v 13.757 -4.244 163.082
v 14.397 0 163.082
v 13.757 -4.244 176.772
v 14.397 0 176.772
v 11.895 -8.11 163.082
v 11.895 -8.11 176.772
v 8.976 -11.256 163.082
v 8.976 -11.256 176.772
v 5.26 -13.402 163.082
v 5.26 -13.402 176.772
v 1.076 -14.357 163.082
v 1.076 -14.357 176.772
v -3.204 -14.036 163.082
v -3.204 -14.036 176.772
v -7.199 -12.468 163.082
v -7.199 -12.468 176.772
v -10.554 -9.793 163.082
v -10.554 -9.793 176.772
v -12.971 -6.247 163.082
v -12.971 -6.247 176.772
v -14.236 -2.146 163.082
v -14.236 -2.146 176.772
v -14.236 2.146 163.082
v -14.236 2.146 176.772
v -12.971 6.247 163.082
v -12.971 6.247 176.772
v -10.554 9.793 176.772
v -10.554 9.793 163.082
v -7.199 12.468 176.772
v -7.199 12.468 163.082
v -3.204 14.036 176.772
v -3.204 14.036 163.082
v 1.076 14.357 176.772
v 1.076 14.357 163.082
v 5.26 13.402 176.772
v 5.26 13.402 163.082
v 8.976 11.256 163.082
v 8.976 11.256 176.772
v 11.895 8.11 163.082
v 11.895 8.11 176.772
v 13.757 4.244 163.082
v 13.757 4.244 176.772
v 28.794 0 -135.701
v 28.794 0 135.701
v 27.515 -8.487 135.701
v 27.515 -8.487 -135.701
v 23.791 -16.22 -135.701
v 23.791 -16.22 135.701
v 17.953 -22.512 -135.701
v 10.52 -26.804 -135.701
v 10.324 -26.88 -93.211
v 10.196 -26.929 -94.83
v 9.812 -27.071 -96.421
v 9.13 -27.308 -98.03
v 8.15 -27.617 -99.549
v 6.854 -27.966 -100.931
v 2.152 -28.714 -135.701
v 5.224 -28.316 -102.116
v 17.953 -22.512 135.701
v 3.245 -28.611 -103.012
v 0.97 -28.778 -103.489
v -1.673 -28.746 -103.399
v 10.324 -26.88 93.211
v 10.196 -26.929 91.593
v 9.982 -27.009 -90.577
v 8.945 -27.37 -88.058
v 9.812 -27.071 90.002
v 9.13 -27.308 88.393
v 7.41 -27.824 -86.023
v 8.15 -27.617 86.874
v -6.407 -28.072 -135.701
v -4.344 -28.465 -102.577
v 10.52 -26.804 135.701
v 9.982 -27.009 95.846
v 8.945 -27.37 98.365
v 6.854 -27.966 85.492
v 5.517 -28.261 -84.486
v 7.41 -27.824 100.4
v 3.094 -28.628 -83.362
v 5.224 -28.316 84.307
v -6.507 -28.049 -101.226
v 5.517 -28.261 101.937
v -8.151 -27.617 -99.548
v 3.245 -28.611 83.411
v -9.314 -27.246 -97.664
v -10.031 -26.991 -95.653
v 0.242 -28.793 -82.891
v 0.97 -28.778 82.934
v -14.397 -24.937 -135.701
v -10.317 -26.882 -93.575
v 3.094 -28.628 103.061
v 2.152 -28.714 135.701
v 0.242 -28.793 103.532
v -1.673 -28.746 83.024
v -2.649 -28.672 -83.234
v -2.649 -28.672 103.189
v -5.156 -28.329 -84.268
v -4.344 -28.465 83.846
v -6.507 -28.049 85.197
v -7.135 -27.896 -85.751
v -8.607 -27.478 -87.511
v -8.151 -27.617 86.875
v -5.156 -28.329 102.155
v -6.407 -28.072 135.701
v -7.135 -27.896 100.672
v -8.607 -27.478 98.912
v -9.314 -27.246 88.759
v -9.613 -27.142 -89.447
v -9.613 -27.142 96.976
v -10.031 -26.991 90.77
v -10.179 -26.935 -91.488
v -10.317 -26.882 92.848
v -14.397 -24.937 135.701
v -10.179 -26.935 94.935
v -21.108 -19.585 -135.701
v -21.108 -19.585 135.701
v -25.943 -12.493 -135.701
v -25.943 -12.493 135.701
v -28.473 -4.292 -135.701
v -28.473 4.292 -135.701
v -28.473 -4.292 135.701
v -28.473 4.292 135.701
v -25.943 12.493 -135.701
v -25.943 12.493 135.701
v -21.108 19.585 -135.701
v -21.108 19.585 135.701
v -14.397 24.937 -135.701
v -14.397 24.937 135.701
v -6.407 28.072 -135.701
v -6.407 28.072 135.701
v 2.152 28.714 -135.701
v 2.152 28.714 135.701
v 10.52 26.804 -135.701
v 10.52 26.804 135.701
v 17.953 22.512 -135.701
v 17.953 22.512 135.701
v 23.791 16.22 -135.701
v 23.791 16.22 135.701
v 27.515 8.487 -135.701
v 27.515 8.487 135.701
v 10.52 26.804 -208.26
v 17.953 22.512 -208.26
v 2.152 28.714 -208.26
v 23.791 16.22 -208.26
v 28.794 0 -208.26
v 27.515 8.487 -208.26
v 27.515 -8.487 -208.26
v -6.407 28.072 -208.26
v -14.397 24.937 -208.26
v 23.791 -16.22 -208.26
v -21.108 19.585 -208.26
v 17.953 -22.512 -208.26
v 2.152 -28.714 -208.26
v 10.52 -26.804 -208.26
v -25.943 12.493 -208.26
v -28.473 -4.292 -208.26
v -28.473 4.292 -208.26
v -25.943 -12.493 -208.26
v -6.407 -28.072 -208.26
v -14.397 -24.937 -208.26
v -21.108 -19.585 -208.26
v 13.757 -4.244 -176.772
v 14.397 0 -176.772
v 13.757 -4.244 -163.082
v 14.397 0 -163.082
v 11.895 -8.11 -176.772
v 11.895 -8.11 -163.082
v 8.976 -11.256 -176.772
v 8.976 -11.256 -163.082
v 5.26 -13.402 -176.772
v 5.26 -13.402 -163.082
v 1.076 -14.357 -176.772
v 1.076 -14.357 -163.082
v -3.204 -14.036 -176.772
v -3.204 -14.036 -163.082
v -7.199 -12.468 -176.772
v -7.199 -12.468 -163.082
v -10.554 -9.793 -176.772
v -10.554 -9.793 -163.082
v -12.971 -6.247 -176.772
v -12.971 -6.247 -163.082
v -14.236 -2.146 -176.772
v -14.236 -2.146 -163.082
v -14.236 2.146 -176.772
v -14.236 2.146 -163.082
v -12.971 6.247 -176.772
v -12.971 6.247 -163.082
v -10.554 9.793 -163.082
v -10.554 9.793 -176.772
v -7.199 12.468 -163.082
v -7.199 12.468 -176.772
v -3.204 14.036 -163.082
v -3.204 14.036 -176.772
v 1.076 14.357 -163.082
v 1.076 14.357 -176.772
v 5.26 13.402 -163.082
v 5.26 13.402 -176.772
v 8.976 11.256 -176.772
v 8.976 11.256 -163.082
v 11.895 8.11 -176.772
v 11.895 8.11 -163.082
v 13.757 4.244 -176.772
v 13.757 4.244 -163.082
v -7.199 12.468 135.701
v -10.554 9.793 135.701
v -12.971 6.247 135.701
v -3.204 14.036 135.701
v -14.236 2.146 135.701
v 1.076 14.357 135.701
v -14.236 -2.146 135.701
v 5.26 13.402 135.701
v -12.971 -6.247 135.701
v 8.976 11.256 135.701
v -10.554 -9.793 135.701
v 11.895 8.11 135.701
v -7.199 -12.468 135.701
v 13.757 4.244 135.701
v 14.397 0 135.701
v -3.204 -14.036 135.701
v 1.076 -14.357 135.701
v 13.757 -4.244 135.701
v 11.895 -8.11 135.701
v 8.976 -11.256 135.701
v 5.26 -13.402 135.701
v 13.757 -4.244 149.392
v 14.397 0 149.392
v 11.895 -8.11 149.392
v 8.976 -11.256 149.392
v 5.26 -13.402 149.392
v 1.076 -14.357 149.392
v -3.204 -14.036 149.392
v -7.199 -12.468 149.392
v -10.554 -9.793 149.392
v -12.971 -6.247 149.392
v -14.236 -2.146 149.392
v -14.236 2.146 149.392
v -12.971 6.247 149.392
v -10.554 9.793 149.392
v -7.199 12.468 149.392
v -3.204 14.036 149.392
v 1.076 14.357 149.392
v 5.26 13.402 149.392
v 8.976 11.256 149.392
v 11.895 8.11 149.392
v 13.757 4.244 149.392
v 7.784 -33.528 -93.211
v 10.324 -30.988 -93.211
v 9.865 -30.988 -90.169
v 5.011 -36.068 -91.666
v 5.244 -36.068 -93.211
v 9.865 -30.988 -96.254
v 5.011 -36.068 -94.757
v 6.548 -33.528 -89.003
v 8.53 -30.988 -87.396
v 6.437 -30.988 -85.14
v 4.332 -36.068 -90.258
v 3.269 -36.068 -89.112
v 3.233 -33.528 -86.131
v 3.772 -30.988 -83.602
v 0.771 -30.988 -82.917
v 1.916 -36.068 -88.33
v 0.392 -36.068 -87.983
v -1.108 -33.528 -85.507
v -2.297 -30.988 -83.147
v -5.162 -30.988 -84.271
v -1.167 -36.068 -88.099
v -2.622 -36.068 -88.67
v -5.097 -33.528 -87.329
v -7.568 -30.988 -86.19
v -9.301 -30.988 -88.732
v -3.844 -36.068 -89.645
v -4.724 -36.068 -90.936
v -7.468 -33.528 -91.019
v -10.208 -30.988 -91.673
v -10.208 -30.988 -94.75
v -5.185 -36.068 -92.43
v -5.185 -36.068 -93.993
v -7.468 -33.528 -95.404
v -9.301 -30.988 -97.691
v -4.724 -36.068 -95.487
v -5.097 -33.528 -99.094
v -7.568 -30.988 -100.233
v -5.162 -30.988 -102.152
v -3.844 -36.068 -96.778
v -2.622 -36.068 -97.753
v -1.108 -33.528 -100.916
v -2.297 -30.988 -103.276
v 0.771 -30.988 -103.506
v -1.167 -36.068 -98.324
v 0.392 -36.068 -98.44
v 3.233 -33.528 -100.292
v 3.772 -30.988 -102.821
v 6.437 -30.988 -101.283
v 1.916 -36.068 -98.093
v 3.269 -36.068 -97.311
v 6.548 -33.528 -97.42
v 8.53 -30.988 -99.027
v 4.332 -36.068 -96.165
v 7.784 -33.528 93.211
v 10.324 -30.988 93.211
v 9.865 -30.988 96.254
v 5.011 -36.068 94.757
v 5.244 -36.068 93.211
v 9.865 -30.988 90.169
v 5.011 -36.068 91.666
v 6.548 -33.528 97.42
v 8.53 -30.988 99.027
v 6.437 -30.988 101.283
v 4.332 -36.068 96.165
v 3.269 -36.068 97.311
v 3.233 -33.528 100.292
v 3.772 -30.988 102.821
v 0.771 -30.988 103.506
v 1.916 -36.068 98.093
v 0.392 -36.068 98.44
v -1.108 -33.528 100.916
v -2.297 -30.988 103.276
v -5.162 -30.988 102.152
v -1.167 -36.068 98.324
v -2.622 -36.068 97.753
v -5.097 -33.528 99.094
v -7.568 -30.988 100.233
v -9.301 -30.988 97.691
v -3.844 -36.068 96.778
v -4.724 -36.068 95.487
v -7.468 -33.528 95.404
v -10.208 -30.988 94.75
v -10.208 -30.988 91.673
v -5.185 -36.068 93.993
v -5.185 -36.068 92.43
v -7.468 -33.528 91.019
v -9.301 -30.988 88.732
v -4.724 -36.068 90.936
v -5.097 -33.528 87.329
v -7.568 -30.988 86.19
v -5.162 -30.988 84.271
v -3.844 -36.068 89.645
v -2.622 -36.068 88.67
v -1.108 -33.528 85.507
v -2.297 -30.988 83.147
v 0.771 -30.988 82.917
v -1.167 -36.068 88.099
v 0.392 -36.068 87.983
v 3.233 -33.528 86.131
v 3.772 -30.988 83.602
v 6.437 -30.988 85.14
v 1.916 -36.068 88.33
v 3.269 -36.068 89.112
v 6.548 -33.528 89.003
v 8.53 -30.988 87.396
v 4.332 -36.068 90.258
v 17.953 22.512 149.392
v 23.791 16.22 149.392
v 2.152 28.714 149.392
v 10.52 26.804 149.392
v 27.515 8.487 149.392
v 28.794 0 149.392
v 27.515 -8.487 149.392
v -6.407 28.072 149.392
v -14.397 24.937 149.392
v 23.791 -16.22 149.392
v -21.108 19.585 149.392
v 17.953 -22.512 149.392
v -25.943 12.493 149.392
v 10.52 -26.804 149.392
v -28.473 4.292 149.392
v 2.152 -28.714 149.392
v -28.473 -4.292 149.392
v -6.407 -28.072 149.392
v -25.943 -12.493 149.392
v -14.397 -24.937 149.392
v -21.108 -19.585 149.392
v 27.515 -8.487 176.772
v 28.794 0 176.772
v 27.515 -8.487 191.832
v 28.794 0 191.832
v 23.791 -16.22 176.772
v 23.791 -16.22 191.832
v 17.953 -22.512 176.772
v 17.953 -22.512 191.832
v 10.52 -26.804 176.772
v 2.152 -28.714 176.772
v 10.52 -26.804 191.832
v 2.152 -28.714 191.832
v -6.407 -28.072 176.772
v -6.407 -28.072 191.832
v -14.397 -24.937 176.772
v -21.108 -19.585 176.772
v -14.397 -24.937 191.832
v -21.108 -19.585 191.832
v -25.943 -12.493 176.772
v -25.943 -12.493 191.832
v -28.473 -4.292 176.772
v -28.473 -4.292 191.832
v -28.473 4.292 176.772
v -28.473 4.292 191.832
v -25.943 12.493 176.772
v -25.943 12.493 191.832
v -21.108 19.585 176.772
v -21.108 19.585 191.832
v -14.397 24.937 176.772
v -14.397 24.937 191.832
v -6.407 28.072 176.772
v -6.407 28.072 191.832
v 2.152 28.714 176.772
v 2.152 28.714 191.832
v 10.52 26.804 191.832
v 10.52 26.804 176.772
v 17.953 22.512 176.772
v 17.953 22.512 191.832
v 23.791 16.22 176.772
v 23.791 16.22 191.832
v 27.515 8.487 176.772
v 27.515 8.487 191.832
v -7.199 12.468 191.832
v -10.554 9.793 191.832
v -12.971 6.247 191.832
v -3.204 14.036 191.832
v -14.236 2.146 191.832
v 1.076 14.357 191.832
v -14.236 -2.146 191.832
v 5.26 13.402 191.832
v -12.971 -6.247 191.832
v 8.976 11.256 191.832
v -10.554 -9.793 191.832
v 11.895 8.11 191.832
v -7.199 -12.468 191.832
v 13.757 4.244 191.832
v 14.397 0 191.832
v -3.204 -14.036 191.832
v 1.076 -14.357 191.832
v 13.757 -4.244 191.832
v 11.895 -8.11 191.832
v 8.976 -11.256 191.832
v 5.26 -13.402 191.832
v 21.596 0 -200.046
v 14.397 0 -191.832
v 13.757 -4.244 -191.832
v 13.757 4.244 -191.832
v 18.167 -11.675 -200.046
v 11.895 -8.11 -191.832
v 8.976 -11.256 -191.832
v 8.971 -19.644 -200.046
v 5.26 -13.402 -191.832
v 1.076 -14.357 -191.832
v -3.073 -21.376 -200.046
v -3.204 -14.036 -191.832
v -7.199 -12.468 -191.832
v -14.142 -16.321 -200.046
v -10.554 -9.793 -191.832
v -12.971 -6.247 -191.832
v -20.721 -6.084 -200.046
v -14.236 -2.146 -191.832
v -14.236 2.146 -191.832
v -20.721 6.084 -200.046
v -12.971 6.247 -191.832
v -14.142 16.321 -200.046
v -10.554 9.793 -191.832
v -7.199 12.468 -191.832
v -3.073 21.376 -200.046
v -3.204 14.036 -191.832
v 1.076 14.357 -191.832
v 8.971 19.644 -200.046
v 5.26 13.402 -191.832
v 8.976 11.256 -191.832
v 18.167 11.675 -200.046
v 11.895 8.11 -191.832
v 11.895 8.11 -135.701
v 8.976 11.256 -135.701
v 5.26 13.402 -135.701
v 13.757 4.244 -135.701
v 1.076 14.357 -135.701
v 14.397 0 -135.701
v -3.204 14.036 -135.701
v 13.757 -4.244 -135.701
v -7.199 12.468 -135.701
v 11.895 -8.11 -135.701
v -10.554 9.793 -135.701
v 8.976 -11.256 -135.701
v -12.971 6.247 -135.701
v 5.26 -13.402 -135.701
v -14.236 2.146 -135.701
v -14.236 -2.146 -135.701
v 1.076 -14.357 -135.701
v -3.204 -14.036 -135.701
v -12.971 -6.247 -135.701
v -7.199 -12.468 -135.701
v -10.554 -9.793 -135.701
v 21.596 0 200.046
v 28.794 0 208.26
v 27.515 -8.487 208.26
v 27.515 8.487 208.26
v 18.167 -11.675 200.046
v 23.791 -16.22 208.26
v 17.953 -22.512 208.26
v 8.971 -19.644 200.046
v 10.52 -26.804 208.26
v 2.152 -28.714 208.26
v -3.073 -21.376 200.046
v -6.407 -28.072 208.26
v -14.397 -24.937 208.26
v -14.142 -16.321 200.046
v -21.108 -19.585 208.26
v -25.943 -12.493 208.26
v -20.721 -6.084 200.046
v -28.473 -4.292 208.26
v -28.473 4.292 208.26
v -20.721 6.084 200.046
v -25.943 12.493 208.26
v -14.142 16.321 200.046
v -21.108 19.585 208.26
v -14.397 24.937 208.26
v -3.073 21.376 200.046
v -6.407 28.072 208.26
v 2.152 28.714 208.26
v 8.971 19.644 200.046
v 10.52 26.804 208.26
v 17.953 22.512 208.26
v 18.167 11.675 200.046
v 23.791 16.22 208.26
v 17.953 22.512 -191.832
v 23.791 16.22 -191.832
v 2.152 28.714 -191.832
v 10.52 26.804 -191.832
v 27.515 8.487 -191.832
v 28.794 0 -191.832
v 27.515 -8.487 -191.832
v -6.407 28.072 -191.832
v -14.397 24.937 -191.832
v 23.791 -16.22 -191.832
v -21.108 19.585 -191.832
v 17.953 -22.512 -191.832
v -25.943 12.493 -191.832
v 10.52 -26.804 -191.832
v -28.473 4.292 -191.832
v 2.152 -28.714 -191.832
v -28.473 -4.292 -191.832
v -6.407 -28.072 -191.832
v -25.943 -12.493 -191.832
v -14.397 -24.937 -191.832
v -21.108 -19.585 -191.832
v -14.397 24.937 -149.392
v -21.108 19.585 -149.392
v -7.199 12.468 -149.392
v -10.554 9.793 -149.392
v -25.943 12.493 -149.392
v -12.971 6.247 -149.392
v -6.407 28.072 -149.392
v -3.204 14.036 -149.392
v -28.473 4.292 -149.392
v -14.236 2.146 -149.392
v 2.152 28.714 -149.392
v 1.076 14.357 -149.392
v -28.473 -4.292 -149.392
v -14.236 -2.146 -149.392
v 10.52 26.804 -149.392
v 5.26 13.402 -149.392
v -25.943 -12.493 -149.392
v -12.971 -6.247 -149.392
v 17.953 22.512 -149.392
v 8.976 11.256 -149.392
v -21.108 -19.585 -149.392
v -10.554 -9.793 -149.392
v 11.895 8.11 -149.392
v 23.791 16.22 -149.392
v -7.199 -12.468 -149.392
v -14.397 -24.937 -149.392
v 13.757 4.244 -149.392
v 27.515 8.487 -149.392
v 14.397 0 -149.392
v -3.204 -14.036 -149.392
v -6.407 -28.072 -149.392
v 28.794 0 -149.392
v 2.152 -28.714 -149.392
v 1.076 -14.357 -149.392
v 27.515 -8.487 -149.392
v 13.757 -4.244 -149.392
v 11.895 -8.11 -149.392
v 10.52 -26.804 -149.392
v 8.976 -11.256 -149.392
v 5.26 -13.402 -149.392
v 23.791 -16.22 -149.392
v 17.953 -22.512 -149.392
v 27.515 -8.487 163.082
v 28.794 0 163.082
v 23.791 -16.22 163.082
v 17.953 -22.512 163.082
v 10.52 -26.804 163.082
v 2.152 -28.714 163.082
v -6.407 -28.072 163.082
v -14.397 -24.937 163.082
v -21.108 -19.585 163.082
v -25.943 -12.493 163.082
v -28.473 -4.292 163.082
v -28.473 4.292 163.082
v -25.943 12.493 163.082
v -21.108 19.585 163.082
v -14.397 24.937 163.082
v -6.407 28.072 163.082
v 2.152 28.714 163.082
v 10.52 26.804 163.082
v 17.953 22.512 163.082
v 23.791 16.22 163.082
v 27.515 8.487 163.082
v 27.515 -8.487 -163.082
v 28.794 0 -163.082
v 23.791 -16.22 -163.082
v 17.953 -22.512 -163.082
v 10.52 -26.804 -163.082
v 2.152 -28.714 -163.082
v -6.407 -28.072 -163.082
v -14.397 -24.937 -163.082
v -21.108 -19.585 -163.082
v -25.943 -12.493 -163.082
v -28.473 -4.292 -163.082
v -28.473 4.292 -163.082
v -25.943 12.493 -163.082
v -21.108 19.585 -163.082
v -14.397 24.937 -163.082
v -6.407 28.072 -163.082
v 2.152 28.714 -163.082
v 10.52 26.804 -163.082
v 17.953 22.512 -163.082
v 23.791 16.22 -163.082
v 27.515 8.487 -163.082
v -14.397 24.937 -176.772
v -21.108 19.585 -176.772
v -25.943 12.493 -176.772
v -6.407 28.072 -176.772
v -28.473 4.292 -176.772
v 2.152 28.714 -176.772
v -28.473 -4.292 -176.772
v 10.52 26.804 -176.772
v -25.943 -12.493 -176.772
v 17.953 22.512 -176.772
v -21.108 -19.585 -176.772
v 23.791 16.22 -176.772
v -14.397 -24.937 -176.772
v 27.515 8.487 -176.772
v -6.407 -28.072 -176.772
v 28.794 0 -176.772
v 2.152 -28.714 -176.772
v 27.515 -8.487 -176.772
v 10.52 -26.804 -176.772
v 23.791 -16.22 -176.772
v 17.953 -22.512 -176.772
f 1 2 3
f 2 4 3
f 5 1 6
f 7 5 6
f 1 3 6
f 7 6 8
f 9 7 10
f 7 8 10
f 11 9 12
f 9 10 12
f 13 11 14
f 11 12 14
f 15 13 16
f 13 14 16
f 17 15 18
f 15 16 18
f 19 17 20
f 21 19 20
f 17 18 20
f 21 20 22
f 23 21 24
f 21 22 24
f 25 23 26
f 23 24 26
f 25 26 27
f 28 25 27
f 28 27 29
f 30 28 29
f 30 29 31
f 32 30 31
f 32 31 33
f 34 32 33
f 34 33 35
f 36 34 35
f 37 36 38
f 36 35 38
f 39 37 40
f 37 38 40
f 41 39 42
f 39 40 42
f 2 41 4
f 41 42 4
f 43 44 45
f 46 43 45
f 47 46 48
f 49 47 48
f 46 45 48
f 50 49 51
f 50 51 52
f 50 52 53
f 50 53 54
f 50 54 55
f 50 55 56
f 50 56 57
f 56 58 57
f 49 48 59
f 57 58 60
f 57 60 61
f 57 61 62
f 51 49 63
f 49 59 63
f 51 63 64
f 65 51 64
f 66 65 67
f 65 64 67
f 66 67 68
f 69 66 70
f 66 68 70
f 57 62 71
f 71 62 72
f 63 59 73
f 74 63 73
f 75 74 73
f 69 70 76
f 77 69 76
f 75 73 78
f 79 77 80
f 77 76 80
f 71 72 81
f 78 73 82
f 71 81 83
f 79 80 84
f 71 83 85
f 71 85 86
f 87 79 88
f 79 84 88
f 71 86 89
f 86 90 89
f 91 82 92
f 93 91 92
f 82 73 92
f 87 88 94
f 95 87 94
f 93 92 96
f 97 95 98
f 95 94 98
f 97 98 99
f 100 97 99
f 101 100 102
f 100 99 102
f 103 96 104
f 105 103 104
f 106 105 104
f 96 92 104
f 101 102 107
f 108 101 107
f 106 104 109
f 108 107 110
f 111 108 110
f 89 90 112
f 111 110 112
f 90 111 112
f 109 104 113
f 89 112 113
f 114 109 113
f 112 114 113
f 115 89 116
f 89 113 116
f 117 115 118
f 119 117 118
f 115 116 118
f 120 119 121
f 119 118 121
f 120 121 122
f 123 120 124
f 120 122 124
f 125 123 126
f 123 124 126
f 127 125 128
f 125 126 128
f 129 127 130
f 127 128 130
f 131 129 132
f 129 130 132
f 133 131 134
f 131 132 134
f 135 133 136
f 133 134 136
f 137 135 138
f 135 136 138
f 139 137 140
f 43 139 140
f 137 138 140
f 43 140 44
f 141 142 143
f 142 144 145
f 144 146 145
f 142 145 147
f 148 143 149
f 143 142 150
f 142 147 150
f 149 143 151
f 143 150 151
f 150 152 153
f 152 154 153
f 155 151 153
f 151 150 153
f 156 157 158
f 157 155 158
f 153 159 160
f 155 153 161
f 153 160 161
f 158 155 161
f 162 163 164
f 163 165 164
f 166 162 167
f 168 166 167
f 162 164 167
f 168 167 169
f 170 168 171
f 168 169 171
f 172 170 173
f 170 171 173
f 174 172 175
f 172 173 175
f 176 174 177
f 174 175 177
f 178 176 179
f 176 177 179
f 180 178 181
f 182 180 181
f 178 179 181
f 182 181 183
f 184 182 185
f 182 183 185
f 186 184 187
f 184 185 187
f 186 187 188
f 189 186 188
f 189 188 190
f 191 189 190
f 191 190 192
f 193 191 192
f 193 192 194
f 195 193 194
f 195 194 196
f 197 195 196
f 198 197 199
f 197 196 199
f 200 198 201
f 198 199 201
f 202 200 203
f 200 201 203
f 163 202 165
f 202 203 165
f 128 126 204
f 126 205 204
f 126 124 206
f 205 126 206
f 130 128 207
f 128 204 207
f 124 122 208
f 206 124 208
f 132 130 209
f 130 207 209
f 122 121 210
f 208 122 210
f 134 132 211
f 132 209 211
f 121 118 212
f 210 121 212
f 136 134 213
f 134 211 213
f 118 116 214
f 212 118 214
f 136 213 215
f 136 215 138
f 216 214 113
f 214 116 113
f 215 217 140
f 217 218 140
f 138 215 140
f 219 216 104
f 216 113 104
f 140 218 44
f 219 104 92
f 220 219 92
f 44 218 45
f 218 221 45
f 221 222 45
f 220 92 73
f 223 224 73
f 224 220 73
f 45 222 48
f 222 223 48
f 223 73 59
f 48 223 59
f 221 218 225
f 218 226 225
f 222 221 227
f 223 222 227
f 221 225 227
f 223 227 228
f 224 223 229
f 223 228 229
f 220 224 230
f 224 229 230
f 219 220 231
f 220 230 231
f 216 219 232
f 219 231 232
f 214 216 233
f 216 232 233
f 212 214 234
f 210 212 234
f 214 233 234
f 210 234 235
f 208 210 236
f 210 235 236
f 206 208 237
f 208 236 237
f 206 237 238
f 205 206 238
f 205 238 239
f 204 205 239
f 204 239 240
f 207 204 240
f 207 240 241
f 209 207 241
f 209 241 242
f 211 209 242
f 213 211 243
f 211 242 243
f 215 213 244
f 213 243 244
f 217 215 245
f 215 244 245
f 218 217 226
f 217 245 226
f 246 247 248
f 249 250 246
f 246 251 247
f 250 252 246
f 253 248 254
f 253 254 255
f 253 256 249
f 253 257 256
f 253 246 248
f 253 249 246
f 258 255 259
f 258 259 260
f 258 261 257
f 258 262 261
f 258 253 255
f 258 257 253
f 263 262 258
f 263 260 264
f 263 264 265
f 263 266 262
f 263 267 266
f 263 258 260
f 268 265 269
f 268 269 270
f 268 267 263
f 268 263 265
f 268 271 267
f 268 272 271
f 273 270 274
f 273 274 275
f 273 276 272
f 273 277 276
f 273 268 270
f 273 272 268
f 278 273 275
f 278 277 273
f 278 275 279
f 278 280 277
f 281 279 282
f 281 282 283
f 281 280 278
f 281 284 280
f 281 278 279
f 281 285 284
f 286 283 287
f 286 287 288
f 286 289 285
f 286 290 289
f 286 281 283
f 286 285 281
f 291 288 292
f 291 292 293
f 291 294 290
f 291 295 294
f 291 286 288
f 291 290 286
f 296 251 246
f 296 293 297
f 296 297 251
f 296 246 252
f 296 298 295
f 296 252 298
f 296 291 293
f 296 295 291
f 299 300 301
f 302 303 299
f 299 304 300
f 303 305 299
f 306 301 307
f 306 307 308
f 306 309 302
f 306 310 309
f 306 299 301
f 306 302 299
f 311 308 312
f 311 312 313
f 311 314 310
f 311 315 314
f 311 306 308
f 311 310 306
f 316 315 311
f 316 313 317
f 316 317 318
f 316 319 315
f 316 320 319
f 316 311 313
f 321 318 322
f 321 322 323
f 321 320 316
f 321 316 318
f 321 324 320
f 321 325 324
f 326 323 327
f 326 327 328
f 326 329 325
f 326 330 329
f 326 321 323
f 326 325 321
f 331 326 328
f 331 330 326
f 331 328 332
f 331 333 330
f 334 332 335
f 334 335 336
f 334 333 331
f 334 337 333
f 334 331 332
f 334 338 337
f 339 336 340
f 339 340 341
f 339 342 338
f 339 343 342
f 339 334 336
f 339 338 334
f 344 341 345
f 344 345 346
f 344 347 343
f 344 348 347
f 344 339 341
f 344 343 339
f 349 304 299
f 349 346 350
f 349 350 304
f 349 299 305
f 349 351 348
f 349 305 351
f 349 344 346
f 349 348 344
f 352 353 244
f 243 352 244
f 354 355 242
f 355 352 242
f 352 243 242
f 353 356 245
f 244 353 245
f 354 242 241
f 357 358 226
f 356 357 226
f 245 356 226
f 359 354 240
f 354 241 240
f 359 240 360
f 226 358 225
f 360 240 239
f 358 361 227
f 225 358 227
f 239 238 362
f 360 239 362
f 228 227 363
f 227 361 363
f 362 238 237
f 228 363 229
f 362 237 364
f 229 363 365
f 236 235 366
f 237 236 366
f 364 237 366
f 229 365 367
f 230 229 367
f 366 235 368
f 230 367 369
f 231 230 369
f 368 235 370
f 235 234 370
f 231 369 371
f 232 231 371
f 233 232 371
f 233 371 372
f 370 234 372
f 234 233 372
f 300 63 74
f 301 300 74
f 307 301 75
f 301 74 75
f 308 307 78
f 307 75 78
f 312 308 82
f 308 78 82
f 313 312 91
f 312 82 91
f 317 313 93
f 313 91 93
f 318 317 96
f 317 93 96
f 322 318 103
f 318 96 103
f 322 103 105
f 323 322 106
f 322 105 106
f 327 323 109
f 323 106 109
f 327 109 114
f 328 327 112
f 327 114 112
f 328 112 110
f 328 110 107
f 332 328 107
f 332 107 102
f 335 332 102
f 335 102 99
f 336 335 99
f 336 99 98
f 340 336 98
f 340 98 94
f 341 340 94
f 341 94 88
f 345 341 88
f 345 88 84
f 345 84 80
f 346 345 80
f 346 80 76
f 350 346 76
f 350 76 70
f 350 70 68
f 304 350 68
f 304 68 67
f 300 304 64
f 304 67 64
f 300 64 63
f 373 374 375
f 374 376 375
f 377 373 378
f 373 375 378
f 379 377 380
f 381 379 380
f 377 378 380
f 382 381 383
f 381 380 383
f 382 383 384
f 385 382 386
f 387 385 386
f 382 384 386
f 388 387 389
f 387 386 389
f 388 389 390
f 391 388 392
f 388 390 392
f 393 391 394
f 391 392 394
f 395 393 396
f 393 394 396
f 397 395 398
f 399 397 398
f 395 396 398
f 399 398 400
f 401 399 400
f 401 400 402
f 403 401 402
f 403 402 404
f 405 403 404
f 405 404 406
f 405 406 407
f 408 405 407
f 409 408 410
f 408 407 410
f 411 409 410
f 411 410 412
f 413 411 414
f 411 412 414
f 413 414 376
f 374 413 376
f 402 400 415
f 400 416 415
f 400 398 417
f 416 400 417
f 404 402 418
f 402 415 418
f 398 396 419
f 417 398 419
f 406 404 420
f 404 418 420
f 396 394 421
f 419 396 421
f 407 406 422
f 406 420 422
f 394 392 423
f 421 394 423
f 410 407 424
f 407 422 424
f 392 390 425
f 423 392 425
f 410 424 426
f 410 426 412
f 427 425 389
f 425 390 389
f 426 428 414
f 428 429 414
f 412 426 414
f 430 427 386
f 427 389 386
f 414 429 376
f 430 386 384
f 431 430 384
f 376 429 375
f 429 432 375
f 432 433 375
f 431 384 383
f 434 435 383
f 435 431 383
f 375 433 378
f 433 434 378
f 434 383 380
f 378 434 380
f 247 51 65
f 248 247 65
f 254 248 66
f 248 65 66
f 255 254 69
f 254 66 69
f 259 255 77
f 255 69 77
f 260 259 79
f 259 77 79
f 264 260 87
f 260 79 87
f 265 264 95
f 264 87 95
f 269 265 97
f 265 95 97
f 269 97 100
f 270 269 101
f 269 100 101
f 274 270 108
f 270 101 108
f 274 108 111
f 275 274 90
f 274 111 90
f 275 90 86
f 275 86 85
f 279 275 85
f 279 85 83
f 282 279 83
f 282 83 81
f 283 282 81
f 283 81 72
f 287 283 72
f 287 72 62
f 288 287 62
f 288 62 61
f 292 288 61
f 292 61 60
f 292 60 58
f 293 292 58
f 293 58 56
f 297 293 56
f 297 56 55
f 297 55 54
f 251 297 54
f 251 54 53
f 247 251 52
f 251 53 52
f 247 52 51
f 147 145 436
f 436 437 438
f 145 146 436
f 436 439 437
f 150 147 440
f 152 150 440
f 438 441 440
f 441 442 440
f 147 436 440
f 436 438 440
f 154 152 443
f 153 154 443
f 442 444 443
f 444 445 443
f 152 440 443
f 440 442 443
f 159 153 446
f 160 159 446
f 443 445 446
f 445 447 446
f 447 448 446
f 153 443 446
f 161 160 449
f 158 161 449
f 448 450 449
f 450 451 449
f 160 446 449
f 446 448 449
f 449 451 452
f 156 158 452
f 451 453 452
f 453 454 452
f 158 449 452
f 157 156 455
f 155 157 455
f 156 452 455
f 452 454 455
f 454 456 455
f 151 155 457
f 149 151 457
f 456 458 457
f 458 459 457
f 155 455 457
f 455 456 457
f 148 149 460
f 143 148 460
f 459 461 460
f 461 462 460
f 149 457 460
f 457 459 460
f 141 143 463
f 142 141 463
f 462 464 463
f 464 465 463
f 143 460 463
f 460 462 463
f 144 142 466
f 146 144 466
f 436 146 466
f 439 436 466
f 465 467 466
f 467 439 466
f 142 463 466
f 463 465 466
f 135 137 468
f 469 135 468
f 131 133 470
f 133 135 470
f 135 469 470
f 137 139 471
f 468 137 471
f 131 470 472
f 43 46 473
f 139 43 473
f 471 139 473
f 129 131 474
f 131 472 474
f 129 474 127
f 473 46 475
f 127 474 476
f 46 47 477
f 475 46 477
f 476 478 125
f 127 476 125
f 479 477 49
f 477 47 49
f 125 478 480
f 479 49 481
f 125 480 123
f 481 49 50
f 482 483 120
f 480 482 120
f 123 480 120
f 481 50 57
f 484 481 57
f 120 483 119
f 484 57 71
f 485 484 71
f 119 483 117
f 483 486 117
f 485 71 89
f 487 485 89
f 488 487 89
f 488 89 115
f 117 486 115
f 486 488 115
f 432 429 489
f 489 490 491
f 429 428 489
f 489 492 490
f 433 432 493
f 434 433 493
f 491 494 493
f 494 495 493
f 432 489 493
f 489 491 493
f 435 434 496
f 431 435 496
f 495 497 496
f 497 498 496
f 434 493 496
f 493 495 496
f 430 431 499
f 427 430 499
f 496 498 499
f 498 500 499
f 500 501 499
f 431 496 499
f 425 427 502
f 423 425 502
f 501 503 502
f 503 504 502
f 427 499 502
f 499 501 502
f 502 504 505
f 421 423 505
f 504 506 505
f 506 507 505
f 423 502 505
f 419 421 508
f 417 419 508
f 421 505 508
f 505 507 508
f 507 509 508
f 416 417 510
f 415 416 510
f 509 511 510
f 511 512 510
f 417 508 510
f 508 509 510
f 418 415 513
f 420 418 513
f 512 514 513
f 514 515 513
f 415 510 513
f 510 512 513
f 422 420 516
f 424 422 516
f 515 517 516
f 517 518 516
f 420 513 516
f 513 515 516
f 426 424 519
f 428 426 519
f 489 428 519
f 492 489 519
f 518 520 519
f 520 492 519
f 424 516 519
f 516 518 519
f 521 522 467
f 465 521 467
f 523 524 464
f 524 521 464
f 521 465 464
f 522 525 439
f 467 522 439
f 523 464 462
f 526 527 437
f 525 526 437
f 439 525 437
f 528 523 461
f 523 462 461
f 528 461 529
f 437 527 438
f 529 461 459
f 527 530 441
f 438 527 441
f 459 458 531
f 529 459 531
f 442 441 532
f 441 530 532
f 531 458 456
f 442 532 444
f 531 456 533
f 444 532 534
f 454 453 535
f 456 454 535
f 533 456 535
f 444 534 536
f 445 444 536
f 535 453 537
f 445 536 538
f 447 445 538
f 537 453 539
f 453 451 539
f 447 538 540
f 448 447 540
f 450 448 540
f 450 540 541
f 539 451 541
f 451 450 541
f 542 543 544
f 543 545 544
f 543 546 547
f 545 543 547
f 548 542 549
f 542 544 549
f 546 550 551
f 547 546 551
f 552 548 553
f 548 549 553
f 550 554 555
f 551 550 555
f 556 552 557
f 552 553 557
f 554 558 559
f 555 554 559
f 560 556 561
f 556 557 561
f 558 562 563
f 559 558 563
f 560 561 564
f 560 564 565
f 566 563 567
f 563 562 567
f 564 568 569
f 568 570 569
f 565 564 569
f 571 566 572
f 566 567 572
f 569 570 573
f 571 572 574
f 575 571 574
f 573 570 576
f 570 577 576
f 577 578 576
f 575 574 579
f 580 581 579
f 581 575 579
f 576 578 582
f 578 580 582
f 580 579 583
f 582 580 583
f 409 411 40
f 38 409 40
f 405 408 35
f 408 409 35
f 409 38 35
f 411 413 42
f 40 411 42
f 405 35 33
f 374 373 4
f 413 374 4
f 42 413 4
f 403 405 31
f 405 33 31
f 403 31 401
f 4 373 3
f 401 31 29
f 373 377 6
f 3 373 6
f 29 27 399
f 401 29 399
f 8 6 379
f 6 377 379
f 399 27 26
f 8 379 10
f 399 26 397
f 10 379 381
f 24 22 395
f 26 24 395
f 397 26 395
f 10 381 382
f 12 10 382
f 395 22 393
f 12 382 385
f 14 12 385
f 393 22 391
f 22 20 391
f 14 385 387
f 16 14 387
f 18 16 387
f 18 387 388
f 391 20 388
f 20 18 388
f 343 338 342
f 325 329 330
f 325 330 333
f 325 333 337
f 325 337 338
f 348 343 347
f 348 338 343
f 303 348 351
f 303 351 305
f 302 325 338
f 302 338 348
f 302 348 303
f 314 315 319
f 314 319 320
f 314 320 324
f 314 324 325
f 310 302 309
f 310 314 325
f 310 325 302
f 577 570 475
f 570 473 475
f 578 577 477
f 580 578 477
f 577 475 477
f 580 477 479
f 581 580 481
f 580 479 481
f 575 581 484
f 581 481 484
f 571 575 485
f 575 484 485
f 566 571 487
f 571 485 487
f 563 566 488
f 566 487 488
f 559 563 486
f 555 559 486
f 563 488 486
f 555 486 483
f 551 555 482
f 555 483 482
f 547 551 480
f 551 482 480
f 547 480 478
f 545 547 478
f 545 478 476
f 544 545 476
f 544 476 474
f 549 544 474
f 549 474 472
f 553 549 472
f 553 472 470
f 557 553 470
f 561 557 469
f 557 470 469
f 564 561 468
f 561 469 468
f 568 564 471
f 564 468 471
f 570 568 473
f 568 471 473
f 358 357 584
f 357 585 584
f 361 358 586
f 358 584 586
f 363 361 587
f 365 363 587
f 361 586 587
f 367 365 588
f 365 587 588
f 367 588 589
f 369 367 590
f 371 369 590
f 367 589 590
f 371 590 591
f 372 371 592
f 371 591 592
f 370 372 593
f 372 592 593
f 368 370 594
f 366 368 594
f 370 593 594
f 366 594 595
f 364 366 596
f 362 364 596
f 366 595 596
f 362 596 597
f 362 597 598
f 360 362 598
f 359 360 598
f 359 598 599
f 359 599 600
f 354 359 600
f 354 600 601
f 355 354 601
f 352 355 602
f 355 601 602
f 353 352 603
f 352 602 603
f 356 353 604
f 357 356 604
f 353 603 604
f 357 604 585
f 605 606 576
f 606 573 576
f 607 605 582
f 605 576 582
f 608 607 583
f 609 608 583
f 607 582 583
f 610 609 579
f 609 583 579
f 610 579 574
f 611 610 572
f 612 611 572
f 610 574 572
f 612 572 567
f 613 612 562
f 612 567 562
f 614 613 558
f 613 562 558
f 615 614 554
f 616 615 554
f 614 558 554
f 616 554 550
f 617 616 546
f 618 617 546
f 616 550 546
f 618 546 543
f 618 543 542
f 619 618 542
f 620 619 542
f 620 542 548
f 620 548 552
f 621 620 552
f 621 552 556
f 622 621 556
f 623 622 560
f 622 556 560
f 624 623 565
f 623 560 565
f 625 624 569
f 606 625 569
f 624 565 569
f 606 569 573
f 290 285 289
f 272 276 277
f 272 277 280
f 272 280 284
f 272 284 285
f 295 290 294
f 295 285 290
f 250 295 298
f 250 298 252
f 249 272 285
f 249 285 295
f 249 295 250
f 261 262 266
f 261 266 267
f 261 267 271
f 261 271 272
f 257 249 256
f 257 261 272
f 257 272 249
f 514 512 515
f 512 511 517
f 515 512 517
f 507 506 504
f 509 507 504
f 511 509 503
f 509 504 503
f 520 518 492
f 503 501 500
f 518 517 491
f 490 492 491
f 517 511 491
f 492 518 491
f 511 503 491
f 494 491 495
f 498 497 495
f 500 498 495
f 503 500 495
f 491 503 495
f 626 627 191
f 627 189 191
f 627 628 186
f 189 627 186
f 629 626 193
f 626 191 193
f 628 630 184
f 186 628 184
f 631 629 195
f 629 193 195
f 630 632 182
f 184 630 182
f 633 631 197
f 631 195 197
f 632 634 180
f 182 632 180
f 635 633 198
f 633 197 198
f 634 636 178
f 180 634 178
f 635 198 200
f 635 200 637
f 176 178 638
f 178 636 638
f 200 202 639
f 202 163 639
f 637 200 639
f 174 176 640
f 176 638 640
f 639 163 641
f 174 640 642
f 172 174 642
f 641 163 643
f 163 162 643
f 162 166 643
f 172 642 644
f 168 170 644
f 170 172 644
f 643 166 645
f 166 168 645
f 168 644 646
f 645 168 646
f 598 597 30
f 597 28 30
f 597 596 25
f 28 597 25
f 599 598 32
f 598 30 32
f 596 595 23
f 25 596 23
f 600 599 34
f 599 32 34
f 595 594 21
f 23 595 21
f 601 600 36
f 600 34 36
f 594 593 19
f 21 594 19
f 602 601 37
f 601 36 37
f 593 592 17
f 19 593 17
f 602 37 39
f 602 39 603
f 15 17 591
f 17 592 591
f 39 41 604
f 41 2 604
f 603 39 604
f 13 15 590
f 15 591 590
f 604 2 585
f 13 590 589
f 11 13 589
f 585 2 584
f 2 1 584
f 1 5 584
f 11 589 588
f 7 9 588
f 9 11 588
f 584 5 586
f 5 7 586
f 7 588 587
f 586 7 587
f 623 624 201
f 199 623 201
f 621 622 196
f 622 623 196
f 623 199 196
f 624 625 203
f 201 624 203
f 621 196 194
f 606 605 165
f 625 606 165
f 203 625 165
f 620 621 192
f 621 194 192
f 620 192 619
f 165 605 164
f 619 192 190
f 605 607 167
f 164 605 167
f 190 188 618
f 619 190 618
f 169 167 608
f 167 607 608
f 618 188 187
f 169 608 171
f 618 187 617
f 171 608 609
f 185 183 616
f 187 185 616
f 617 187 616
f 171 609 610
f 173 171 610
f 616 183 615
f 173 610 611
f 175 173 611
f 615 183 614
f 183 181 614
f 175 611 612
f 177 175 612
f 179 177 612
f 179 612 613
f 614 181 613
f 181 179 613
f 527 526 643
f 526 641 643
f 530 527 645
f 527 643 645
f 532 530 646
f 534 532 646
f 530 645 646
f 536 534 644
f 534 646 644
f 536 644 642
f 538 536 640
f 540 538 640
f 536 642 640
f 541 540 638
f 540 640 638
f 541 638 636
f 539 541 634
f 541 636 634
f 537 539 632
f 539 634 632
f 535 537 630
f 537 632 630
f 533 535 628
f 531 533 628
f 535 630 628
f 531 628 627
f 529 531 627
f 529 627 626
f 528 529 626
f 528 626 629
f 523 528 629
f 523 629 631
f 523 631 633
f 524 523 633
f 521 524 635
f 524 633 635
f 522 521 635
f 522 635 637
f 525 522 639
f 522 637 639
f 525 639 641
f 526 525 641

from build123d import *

# Parameters (mm, degrees)
F2_R     = 10.323596
F3_DEPTH = 36.068
F4_SIZE  = 5.08


with BuildPart() as f1:
    # F0 (on Front) → F1 (revolve)
    with BuildSketch(Plane.XZ):
        Polygon((0, 208.260372), (0, 0), (28.794192, 0), (28.794192, 135.701105), (14.397096, 135.701105), (14.397096, 149.391532), (28.794192, 149.391532), (28.794192, 163.081944), (14.397096, 163.081944), (14.397096, 176.772371), (28.794192, 176.772371), (28.794192, 191.831857), (14.397096, 191.831857), (28.794192, 208.260372), align=None)
        Polygon((28.794192, 0), (0, 0), (0, -208.260372), (28.794192, -208.260372), (14.397096, -191.831857), (28.794192, -191.831857), (28.794192, -176.772371), (14.397096, -176.772371), (14.397096, -163.081944), (28.794192, -163.081944), (28.794192, -149.391532), (14.397096, -149.391532), (14.397096, -135.701105), (28.794192, -135.701105), align=None)
    revolve(axis=Axis((0, 0, -104.130186), (0, 0, -1)))

    # F2 (on Front) → F3 (join)
    with BuildSketch(Plane.XZ):
        with Locations((0, 93.211494)):
            Circle(F2_R)
        with Locations((0, -93.211494)):
            Circle(F2_R)
    extrude(amount=F3_DEPTH)

    # F4
    f4_edges = [f1.edges().sort_by_distance(p)[0] for p in [
        (-10.323596, -36.068, 93.211494),
        (-10.323596, -36.068, -93.211494),
    ]]
    chamfer(f4_edges, length=F4_SIZE)


solid = f1.part
